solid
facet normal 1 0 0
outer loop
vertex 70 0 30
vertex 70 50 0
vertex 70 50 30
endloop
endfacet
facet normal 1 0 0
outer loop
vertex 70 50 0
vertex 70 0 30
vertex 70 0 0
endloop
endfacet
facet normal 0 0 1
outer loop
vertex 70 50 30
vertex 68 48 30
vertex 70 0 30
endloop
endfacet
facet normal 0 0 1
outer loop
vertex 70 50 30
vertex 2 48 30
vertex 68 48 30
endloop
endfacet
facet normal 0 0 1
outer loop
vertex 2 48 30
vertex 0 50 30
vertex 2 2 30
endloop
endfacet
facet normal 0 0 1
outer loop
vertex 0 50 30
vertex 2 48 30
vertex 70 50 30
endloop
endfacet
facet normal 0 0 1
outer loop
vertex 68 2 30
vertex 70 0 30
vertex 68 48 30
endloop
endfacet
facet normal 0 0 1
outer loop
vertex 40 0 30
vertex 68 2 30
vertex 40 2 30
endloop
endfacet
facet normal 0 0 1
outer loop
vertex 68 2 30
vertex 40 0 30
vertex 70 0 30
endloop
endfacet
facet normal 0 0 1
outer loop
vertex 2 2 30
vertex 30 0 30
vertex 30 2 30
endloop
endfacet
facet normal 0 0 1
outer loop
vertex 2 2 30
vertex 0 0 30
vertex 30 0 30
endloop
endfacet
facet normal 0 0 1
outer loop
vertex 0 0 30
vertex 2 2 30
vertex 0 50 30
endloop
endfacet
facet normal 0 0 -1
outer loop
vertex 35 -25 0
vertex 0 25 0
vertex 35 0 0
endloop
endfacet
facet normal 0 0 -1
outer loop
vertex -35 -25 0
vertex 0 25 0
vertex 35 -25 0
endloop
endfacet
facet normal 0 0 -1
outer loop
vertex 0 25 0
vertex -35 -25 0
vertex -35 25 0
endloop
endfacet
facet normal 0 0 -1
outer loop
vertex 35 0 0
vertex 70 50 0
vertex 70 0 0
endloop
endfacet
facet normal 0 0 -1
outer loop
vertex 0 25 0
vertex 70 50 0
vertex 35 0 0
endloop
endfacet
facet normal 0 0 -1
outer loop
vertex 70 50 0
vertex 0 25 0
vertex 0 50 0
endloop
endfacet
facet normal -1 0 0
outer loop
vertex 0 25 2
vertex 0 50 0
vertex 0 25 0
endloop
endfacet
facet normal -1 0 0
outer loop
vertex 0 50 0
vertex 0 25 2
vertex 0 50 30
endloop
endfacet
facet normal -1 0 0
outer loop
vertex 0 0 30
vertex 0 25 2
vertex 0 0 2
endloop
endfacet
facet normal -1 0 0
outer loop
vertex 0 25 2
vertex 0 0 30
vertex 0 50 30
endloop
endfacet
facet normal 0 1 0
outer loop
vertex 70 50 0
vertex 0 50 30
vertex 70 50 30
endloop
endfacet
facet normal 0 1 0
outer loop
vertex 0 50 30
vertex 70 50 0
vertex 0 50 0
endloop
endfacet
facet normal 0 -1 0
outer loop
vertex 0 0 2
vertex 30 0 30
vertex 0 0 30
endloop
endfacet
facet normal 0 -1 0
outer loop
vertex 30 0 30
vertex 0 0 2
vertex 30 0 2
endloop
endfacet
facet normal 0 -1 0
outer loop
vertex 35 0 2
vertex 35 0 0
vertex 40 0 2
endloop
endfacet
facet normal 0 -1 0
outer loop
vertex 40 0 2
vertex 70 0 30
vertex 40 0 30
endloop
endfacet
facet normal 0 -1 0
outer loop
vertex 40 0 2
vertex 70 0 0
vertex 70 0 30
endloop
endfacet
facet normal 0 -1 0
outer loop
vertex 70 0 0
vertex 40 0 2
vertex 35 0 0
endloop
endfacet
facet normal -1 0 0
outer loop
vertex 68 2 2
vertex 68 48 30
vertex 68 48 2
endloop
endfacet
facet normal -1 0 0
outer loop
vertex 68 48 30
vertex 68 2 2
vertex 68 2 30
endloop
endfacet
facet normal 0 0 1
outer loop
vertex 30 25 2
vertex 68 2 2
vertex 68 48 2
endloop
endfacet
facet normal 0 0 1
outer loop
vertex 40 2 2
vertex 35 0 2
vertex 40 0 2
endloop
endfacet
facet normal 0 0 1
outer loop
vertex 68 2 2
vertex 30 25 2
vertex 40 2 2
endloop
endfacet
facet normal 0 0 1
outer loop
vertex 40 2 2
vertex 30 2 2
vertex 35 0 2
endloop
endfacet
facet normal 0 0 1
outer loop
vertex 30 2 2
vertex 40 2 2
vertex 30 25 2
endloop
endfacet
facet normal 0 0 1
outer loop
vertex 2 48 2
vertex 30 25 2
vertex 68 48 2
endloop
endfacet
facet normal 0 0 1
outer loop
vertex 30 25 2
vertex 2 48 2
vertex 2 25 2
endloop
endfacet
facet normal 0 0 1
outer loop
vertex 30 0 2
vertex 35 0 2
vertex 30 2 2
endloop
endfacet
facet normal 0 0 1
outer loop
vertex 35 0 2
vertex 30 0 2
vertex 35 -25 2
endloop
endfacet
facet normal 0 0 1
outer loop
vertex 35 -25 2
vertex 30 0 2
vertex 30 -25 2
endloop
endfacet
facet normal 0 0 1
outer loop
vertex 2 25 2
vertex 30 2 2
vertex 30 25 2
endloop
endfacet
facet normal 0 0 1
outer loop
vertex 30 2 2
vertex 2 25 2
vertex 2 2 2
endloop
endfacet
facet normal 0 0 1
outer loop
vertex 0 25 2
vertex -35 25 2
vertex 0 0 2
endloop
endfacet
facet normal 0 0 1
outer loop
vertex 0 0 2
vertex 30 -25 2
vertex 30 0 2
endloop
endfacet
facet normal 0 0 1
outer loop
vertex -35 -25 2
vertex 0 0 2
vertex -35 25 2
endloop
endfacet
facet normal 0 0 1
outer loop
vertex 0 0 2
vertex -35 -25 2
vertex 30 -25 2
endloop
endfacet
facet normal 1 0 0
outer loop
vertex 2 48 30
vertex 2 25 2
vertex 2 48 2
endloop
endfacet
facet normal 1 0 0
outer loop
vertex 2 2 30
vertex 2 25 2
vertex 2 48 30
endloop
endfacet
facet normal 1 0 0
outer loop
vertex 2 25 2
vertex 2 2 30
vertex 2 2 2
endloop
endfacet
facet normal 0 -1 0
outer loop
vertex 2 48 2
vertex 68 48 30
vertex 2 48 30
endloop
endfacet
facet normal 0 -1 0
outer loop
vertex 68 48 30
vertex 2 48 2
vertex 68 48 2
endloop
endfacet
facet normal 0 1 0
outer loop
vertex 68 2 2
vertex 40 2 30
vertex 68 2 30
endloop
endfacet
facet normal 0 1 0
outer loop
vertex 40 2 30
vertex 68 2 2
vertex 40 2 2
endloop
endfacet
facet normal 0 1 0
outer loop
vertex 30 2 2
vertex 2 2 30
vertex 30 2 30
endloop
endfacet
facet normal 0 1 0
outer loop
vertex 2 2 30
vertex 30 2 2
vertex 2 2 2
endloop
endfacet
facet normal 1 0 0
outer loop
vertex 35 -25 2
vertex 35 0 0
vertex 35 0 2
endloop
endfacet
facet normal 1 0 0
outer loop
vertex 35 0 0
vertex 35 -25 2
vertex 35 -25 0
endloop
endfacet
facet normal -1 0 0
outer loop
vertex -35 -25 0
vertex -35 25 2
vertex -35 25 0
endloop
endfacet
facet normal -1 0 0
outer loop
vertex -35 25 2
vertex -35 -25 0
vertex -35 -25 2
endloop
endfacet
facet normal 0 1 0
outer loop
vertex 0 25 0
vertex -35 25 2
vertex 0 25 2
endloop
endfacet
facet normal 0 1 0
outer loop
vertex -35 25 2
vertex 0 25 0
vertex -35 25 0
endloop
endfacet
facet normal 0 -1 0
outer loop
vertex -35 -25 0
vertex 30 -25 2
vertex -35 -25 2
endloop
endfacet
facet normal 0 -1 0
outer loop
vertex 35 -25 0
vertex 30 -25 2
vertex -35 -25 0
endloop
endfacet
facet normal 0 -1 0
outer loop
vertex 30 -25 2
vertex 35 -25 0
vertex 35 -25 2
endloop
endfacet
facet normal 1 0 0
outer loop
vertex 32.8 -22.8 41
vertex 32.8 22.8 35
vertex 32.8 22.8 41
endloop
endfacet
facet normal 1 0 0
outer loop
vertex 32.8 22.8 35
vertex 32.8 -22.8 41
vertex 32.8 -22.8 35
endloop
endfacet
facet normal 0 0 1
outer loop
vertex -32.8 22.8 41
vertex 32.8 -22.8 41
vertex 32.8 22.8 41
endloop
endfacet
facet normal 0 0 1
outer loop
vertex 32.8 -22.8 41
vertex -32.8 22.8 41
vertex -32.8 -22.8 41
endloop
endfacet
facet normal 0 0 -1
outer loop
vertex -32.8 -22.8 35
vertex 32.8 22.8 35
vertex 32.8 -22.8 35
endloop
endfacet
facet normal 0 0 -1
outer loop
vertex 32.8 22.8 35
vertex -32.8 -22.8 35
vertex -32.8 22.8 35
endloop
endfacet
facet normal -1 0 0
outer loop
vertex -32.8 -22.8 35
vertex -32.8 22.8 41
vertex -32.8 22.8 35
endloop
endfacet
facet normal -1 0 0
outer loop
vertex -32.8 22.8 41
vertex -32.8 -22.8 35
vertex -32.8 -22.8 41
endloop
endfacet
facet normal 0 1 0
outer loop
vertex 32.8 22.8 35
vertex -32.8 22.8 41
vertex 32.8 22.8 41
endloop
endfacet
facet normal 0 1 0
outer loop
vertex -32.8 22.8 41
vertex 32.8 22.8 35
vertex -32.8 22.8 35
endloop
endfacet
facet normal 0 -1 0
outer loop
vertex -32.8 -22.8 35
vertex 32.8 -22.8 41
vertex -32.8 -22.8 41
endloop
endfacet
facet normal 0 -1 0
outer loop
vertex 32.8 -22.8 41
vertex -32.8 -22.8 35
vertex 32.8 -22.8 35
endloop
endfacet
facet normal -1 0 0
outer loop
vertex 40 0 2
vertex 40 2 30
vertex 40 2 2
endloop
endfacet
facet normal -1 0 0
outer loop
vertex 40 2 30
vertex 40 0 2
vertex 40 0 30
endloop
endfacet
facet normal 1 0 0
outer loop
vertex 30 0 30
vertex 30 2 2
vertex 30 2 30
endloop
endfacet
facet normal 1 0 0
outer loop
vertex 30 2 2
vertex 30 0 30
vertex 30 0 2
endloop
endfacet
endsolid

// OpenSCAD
// Two-part enclosure for a small electronics board (e.g. Arduino-based temperature logger)
// Print orientation: both parts rest on the XY plane at z = 0, side by side on the bed.
// The lid is printed upside down: a flat plate with a rectangular lip that slides into the
// box opening with 0.2 mm clearance on each side.
//

// ---------------- Parameters ----------------
box_x      = 70;    // box outer length (X)
box_y      = 50;    // box outer width (Y)
box_h      = 30;    // box outer height (Z)
wall       = 2;     // box wall thickness
floor      = 2;     // box floor thickness
lip_t      = 1.5;   // lip wall thickness
lip_h      = 4;     // lip height above plate
lip_x      = 65.6;  // lip outer length (X)
lip_y      = 45.6;  // lip outer width (Y)
clearance  = 0.2;   // clearance between lip outer size and box opening
gap        = 10;    // gap between box and lid on the bed
eps        = 0.5;   // cutter overshoot past faces

$fn = 64;

// Derived: box opening size = outer - 2*wall
opening_x = box_x - 2 * wall;   // 66
opening_y = box_y - 2 * wall;   // 46
// Lip check: outer 65.6 x 45.6 -> 0.2 mm clearance on each side inside the opening

// ---------------- Model ----------------
difference() {
    union() {
        // Part 1: Box (open top)
        difference() {
            cube([box_x, box_y, box_h]);
            // Cut open top: shape extends past the top face
            translate([wall, wall, floor])
                cube([opening_x, opening_y, box_h - floor + eps]);
        }

        // Part 2: Lid (printed upside down)
        // Plate lying on the bed, with a rectangular lip on top of it
        union() {
            // Base plate
            translate([-box_x / 2, -box_y / 2, 0])
                cube([box_x, box_y, 2]);   // 2 mm plate

            // Lip centred on the plate
            translate([-lip_x / 2, -lip_y / 2, box_y / 2 + gap])
                cube([lip_x, lip_y, lip_h + wall]);
        }
    }

    // Cut a 10 mm gap between the two parts along X
    translate([box_x / 2 - gap / 2, -box_y / 2 - 1, floor])
        cube([gap, box_y + 2, box_h + 1]);
}
